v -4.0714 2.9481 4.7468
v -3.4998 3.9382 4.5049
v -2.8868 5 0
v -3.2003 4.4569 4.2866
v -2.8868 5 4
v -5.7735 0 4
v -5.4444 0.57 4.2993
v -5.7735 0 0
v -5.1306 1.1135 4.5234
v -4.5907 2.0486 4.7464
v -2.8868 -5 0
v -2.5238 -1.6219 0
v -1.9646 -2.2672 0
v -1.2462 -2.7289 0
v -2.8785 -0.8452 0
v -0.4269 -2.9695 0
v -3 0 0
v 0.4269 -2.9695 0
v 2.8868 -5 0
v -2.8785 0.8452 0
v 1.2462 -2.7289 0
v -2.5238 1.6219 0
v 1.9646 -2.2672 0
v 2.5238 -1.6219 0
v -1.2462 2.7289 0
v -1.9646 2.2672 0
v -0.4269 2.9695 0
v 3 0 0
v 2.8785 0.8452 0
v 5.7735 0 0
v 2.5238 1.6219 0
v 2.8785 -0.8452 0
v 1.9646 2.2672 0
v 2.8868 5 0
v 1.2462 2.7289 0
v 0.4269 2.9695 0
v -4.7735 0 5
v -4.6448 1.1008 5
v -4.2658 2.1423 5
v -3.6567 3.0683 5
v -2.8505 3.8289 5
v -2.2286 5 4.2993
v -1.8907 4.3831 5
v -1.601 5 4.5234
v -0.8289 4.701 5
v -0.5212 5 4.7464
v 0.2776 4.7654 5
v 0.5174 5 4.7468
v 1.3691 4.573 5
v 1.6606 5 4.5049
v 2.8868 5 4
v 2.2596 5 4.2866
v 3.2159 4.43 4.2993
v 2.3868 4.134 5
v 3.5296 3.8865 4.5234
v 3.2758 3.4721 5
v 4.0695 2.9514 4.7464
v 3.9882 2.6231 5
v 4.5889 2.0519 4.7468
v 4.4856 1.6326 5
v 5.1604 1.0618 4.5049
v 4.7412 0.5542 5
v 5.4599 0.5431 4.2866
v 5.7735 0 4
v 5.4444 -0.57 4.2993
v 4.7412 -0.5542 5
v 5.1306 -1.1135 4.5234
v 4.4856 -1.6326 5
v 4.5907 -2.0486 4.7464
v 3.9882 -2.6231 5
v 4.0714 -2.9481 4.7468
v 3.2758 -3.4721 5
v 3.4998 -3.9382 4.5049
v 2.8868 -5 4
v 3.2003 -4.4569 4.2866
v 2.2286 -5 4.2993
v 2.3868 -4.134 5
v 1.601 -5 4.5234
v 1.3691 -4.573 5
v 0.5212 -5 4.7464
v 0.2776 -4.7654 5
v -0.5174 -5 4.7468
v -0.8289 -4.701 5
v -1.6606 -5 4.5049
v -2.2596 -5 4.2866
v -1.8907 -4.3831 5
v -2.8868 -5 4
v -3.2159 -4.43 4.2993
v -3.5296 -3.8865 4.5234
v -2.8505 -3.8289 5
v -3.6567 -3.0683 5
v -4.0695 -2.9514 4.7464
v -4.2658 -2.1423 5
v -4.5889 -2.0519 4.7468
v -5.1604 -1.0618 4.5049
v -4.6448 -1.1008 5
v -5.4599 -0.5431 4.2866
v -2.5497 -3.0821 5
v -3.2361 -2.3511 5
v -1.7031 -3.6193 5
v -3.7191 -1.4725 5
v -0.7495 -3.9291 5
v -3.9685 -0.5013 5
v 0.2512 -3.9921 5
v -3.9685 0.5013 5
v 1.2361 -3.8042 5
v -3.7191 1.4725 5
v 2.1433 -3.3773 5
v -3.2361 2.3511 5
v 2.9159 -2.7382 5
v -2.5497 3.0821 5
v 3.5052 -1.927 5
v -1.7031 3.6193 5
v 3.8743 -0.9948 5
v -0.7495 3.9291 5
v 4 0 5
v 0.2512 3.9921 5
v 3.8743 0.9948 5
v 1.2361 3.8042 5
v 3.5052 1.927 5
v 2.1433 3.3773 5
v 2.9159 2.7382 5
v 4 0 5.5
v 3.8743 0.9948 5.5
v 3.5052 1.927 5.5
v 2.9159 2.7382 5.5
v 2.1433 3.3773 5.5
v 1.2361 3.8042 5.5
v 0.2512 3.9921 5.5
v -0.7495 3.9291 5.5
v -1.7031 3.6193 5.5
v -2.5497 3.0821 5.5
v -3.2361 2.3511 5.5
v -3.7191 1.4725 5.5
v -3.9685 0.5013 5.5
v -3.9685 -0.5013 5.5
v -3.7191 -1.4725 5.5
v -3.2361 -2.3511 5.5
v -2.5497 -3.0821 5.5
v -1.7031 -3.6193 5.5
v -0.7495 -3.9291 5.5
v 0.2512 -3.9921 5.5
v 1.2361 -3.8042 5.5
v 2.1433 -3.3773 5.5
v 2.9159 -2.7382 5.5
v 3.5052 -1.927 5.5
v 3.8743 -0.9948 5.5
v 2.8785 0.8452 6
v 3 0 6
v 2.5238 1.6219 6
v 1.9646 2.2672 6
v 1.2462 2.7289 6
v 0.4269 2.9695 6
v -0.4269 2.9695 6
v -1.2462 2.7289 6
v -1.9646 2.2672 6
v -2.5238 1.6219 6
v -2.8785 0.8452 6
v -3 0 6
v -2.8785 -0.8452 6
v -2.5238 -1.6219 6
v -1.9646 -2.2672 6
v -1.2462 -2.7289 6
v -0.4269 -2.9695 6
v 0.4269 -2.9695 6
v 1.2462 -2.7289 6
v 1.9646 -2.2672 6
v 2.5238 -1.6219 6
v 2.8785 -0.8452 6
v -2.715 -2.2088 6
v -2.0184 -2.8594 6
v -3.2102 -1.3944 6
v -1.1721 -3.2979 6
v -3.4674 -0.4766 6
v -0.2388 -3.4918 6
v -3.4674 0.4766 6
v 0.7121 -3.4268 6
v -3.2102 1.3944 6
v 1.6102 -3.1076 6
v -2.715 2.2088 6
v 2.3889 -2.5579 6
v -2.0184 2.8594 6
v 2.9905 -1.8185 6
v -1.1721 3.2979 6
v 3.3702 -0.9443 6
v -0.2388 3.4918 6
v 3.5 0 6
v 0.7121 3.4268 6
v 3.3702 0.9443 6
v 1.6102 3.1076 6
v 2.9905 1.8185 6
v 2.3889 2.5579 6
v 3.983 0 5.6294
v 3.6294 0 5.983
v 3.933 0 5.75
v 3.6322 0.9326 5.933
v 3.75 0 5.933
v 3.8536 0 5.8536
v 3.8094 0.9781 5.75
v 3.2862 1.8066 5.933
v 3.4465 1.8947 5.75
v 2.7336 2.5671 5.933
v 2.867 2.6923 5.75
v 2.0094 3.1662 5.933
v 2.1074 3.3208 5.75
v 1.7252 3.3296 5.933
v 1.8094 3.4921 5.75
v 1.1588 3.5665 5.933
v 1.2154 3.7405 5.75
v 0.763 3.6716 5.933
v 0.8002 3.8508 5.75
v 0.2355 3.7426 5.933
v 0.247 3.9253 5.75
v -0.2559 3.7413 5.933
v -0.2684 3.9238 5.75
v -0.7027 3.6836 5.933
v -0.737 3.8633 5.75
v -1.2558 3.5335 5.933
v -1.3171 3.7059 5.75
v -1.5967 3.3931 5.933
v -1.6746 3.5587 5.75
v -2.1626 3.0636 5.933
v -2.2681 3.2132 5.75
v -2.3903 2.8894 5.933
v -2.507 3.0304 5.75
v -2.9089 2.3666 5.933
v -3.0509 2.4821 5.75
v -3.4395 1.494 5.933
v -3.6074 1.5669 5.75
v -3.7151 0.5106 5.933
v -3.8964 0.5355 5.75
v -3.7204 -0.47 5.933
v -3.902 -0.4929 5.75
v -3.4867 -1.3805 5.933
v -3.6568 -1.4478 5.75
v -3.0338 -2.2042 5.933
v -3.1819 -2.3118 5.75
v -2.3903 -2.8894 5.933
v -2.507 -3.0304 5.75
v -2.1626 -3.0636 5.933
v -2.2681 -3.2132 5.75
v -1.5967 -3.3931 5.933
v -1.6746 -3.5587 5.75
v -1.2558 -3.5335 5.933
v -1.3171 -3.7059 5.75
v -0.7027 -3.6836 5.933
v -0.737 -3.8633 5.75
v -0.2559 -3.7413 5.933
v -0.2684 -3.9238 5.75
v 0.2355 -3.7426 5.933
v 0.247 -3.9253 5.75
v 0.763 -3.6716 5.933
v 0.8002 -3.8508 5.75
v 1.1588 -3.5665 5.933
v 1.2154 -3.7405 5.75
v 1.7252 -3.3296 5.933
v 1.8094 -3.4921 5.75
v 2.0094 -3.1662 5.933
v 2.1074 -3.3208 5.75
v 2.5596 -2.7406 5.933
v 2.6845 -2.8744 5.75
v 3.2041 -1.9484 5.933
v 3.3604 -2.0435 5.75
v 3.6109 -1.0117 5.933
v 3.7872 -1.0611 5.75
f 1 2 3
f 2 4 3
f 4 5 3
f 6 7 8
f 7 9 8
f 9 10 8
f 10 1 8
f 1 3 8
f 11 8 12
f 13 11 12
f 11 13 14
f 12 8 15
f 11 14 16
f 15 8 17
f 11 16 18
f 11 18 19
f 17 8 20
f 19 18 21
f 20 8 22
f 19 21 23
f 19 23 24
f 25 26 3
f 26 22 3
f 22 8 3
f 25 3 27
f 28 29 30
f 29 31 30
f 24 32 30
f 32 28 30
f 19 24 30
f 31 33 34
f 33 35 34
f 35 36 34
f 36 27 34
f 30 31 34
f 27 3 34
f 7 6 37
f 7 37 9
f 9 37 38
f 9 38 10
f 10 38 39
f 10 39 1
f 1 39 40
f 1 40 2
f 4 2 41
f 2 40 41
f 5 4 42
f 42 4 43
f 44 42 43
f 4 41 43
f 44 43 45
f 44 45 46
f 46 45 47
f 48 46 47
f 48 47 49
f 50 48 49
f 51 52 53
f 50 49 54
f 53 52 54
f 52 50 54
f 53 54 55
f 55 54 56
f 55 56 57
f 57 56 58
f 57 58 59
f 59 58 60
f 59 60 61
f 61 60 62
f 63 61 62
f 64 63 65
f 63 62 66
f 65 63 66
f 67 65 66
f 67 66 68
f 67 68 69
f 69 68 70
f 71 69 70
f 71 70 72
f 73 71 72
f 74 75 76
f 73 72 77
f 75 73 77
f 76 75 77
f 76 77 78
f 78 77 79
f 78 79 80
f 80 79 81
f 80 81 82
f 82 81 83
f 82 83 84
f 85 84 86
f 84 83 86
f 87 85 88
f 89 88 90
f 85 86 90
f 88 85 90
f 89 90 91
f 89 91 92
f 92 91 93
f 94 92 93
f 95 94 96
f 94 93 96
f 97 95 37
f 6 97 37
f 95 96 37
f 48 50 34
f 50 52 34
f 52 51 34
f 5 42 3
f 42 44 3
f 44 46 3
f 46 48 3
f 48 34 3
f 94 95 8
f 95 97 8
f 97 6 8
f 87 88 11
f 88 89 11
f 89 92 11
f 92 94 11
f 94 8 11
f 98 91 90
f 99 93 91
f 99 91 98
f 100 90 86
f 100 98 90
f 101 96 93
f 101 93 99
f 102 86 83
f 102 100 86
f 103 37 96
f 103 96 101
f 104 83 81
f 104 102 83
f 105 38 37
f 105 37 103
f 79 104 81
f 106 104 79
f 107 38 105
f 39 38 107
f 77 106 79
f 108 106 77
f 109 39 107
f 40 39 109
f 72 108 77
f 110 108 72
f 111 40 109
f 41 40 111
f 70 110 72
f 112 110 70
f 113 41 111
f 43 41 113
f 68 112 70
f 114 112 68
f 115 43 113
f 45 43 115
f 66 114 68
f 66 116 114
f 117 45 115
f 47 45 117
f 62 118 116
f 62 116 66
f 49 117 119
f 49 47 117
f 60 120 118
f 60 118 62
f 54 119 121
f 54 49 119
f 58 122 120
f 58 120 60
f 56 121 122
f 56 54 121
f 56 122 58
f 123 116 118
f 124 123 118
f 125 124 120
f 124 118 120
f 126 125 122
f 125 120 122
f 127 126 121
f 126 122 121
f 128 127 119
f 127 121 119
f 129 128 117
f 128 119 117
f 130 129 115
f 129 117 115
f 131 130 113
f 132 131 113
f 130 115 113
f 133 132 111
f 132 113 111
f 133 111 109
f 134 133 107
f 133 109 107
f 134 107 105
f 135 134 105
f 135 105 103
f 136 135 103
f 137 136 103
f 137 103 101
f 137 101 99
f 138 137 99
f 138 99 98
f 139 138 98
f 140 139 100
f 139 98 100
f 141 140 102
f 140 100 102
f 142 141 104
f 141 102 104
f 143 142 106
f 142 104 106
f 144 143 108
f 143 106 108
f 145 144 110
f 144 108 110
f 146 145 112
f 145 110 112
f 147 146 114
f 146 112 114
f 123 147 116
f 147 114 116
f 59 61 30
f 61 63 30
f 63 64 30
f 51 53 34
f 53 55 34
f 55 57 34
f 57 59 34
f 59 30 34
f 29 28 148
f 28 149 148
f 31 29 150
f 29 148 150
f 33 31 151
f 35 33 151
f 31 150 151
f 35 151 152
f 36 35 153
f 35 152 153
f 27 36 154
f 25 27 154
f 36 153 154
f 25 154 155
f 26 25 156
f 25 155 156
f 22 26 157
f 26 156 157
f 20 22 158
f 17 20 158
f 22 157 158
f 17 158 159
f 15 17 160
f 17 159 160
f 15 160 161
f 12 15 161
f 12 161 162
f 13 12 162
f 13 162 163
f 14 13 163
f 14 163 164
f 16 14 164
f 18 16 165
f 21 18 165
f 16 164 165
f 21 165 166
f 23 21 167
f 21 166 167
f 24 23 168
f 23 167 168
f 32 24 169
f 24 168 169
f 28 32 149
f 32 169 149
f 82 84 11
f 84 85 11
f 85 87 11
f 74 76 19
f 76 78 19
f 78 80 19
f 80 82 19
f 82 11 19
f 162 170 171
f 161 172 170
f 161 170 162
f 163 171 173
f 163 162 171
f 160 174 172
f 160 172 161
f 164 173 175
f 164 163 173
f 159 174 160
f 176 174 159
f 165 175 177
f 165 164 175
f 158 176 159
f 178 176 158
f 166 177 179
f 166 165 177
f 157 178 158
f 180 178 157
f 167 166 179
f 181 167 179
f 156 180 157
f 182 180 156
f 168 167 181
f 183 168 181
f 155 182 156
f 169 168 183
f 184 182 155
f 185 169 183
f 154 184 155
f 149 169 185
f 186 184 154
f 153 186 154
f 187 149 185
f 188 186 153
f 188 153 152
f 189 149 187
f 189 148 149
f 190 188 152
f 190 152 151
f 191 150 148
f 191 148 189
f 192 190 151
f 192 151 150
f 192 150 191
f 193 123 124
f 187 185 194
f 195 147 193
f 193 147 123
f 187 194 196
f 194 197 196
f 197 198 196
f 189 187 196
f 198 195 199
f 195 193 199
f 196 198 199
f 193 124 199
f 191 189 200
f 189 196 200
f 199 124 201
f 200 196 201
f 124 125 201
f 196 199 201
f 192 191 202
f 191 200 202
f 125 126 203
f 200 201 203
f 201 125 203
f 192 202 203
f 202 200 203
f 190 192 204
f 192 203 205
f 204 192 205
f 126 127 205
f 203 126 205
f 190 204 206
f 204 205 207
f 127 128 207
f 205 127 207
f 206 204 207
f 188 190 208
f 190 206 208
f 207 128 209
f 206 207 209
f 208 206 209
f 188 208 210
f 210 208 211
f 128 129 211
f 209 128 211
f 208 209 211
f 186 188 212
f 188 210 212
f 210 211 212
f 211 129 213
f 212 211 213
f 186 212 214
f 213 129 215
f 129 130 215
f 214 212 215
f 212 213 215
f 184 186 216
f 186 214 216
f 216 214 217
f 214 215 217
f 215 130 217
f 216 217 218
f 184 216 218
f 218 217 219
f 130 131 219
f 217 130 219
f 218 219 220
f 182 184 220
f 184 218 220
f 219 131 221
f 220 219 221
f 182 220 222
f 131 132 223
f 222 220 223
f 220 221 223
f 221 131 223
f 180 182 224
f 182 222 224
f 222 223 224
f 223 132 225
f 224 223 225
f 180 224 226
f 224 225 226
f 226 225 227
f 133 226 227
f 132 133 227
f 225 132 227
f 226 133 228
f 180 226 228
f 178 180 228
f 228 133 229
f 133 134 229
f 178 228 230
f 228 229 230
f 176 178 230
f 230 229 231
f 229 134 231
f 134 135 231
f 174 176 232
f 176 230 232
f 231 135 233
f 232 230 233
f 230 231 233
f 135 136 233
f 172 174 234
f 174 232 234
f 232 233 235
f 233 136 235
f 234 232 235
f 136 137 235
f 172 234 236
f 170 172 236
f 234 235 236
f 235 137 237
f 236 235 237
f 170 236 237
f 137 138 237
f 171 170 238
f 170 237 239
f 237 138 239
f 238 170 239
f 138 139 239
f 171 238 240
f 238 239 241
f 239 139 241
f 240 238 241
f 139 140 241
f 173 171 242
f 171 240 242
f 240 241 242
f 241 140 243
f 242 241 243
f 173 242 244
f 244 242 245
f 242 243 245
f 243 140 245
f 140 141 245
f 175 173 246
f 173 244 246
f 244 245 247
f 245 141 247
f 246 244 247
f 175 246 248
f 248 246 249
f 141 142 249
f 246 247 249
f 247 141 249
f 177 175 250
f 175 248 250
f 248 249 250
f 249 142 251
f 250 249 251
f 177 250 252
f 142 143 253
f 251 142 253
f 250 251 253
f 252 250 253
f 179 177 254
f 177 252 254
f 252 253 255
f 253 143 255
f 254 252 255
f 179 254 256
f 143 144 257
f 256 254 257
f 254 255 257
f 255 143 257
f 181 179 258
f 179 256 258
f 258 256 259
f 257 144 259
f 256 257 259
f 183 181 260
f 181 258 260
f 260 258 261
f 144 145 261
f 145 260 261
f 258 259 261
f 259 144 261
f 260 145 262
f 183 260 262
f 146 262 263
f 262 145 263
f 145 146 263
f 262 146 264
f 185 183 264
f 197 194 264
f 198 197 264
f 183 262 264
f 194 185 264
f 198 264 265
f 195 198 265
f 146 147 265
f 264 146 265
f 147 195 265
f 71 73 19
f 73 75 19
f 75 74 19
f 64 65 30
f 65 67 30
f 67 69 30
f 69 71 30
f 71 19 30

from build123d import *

# Parameters (mm, degrees)
EXTRUDE_1_DEPTH     = 5
SKETCH_2_R          = 4
EXTRUDE_2_DEPTH     = 1
SKETCH_2_3_R        = 3
CUT_EXTRUDE_1_DEPTH = 5.5
FILLET_3_R          = 0.5


with BuildPart() as part:
    # 草图1 → 凸台-拉伸1 (new body)
    with BuildSketch(Plane.XY):
        Polygon((5.773502692, 0), (2.886751346, 5), (-2.886751346, 5), (-5.773502692, 0), (-2.886751346, -5), (2.886751346, -5), align=None)
    extrude(amount=EXTRUDE_1_DEPTH)

    # 草图2 → 凸台-拉伸2 (add)
    with BuildSketch(Plane.XY.offset(5)):
        Circle(SKETCH_2_R)
    extrude(amount=EXTRUDE_2_DEPTH)

    # 草图2<3> → 切除-拉伸1 (cut, symmetric)
    with BuildSketch(Plane.XY.offset(5)):
        Circle(SKETCH_2_3_R)
    extrude(amount=CUT_EXTRUDE_1_DEPTH, both=True, mode=Mode.SUBTRACT)

    # 草图3 → 切除-旋转1 (revolve, cut)
    with BuildSketch(Plane(origin=(0, 0, 0), x_dir=(1, 0, 0), z_dir=(0, 1, 0))):
        Polygon((-5.773502692, -5), (-5.773502692, -4), (-4.773502692, -5), align=None)
    revolve(axis=Axis((0, 0, 0), (0, 0, -1)), mode=Mode.SUBTRACT)

    # 圆角3
    fillet_3_edges = [part.edges().sort_by_distance(p)[0] for p in [
        (-4, 0, 6),
    ]]
    fillet(fillet_3_edges, radius=FILLET_3_R)


solid = part.part
